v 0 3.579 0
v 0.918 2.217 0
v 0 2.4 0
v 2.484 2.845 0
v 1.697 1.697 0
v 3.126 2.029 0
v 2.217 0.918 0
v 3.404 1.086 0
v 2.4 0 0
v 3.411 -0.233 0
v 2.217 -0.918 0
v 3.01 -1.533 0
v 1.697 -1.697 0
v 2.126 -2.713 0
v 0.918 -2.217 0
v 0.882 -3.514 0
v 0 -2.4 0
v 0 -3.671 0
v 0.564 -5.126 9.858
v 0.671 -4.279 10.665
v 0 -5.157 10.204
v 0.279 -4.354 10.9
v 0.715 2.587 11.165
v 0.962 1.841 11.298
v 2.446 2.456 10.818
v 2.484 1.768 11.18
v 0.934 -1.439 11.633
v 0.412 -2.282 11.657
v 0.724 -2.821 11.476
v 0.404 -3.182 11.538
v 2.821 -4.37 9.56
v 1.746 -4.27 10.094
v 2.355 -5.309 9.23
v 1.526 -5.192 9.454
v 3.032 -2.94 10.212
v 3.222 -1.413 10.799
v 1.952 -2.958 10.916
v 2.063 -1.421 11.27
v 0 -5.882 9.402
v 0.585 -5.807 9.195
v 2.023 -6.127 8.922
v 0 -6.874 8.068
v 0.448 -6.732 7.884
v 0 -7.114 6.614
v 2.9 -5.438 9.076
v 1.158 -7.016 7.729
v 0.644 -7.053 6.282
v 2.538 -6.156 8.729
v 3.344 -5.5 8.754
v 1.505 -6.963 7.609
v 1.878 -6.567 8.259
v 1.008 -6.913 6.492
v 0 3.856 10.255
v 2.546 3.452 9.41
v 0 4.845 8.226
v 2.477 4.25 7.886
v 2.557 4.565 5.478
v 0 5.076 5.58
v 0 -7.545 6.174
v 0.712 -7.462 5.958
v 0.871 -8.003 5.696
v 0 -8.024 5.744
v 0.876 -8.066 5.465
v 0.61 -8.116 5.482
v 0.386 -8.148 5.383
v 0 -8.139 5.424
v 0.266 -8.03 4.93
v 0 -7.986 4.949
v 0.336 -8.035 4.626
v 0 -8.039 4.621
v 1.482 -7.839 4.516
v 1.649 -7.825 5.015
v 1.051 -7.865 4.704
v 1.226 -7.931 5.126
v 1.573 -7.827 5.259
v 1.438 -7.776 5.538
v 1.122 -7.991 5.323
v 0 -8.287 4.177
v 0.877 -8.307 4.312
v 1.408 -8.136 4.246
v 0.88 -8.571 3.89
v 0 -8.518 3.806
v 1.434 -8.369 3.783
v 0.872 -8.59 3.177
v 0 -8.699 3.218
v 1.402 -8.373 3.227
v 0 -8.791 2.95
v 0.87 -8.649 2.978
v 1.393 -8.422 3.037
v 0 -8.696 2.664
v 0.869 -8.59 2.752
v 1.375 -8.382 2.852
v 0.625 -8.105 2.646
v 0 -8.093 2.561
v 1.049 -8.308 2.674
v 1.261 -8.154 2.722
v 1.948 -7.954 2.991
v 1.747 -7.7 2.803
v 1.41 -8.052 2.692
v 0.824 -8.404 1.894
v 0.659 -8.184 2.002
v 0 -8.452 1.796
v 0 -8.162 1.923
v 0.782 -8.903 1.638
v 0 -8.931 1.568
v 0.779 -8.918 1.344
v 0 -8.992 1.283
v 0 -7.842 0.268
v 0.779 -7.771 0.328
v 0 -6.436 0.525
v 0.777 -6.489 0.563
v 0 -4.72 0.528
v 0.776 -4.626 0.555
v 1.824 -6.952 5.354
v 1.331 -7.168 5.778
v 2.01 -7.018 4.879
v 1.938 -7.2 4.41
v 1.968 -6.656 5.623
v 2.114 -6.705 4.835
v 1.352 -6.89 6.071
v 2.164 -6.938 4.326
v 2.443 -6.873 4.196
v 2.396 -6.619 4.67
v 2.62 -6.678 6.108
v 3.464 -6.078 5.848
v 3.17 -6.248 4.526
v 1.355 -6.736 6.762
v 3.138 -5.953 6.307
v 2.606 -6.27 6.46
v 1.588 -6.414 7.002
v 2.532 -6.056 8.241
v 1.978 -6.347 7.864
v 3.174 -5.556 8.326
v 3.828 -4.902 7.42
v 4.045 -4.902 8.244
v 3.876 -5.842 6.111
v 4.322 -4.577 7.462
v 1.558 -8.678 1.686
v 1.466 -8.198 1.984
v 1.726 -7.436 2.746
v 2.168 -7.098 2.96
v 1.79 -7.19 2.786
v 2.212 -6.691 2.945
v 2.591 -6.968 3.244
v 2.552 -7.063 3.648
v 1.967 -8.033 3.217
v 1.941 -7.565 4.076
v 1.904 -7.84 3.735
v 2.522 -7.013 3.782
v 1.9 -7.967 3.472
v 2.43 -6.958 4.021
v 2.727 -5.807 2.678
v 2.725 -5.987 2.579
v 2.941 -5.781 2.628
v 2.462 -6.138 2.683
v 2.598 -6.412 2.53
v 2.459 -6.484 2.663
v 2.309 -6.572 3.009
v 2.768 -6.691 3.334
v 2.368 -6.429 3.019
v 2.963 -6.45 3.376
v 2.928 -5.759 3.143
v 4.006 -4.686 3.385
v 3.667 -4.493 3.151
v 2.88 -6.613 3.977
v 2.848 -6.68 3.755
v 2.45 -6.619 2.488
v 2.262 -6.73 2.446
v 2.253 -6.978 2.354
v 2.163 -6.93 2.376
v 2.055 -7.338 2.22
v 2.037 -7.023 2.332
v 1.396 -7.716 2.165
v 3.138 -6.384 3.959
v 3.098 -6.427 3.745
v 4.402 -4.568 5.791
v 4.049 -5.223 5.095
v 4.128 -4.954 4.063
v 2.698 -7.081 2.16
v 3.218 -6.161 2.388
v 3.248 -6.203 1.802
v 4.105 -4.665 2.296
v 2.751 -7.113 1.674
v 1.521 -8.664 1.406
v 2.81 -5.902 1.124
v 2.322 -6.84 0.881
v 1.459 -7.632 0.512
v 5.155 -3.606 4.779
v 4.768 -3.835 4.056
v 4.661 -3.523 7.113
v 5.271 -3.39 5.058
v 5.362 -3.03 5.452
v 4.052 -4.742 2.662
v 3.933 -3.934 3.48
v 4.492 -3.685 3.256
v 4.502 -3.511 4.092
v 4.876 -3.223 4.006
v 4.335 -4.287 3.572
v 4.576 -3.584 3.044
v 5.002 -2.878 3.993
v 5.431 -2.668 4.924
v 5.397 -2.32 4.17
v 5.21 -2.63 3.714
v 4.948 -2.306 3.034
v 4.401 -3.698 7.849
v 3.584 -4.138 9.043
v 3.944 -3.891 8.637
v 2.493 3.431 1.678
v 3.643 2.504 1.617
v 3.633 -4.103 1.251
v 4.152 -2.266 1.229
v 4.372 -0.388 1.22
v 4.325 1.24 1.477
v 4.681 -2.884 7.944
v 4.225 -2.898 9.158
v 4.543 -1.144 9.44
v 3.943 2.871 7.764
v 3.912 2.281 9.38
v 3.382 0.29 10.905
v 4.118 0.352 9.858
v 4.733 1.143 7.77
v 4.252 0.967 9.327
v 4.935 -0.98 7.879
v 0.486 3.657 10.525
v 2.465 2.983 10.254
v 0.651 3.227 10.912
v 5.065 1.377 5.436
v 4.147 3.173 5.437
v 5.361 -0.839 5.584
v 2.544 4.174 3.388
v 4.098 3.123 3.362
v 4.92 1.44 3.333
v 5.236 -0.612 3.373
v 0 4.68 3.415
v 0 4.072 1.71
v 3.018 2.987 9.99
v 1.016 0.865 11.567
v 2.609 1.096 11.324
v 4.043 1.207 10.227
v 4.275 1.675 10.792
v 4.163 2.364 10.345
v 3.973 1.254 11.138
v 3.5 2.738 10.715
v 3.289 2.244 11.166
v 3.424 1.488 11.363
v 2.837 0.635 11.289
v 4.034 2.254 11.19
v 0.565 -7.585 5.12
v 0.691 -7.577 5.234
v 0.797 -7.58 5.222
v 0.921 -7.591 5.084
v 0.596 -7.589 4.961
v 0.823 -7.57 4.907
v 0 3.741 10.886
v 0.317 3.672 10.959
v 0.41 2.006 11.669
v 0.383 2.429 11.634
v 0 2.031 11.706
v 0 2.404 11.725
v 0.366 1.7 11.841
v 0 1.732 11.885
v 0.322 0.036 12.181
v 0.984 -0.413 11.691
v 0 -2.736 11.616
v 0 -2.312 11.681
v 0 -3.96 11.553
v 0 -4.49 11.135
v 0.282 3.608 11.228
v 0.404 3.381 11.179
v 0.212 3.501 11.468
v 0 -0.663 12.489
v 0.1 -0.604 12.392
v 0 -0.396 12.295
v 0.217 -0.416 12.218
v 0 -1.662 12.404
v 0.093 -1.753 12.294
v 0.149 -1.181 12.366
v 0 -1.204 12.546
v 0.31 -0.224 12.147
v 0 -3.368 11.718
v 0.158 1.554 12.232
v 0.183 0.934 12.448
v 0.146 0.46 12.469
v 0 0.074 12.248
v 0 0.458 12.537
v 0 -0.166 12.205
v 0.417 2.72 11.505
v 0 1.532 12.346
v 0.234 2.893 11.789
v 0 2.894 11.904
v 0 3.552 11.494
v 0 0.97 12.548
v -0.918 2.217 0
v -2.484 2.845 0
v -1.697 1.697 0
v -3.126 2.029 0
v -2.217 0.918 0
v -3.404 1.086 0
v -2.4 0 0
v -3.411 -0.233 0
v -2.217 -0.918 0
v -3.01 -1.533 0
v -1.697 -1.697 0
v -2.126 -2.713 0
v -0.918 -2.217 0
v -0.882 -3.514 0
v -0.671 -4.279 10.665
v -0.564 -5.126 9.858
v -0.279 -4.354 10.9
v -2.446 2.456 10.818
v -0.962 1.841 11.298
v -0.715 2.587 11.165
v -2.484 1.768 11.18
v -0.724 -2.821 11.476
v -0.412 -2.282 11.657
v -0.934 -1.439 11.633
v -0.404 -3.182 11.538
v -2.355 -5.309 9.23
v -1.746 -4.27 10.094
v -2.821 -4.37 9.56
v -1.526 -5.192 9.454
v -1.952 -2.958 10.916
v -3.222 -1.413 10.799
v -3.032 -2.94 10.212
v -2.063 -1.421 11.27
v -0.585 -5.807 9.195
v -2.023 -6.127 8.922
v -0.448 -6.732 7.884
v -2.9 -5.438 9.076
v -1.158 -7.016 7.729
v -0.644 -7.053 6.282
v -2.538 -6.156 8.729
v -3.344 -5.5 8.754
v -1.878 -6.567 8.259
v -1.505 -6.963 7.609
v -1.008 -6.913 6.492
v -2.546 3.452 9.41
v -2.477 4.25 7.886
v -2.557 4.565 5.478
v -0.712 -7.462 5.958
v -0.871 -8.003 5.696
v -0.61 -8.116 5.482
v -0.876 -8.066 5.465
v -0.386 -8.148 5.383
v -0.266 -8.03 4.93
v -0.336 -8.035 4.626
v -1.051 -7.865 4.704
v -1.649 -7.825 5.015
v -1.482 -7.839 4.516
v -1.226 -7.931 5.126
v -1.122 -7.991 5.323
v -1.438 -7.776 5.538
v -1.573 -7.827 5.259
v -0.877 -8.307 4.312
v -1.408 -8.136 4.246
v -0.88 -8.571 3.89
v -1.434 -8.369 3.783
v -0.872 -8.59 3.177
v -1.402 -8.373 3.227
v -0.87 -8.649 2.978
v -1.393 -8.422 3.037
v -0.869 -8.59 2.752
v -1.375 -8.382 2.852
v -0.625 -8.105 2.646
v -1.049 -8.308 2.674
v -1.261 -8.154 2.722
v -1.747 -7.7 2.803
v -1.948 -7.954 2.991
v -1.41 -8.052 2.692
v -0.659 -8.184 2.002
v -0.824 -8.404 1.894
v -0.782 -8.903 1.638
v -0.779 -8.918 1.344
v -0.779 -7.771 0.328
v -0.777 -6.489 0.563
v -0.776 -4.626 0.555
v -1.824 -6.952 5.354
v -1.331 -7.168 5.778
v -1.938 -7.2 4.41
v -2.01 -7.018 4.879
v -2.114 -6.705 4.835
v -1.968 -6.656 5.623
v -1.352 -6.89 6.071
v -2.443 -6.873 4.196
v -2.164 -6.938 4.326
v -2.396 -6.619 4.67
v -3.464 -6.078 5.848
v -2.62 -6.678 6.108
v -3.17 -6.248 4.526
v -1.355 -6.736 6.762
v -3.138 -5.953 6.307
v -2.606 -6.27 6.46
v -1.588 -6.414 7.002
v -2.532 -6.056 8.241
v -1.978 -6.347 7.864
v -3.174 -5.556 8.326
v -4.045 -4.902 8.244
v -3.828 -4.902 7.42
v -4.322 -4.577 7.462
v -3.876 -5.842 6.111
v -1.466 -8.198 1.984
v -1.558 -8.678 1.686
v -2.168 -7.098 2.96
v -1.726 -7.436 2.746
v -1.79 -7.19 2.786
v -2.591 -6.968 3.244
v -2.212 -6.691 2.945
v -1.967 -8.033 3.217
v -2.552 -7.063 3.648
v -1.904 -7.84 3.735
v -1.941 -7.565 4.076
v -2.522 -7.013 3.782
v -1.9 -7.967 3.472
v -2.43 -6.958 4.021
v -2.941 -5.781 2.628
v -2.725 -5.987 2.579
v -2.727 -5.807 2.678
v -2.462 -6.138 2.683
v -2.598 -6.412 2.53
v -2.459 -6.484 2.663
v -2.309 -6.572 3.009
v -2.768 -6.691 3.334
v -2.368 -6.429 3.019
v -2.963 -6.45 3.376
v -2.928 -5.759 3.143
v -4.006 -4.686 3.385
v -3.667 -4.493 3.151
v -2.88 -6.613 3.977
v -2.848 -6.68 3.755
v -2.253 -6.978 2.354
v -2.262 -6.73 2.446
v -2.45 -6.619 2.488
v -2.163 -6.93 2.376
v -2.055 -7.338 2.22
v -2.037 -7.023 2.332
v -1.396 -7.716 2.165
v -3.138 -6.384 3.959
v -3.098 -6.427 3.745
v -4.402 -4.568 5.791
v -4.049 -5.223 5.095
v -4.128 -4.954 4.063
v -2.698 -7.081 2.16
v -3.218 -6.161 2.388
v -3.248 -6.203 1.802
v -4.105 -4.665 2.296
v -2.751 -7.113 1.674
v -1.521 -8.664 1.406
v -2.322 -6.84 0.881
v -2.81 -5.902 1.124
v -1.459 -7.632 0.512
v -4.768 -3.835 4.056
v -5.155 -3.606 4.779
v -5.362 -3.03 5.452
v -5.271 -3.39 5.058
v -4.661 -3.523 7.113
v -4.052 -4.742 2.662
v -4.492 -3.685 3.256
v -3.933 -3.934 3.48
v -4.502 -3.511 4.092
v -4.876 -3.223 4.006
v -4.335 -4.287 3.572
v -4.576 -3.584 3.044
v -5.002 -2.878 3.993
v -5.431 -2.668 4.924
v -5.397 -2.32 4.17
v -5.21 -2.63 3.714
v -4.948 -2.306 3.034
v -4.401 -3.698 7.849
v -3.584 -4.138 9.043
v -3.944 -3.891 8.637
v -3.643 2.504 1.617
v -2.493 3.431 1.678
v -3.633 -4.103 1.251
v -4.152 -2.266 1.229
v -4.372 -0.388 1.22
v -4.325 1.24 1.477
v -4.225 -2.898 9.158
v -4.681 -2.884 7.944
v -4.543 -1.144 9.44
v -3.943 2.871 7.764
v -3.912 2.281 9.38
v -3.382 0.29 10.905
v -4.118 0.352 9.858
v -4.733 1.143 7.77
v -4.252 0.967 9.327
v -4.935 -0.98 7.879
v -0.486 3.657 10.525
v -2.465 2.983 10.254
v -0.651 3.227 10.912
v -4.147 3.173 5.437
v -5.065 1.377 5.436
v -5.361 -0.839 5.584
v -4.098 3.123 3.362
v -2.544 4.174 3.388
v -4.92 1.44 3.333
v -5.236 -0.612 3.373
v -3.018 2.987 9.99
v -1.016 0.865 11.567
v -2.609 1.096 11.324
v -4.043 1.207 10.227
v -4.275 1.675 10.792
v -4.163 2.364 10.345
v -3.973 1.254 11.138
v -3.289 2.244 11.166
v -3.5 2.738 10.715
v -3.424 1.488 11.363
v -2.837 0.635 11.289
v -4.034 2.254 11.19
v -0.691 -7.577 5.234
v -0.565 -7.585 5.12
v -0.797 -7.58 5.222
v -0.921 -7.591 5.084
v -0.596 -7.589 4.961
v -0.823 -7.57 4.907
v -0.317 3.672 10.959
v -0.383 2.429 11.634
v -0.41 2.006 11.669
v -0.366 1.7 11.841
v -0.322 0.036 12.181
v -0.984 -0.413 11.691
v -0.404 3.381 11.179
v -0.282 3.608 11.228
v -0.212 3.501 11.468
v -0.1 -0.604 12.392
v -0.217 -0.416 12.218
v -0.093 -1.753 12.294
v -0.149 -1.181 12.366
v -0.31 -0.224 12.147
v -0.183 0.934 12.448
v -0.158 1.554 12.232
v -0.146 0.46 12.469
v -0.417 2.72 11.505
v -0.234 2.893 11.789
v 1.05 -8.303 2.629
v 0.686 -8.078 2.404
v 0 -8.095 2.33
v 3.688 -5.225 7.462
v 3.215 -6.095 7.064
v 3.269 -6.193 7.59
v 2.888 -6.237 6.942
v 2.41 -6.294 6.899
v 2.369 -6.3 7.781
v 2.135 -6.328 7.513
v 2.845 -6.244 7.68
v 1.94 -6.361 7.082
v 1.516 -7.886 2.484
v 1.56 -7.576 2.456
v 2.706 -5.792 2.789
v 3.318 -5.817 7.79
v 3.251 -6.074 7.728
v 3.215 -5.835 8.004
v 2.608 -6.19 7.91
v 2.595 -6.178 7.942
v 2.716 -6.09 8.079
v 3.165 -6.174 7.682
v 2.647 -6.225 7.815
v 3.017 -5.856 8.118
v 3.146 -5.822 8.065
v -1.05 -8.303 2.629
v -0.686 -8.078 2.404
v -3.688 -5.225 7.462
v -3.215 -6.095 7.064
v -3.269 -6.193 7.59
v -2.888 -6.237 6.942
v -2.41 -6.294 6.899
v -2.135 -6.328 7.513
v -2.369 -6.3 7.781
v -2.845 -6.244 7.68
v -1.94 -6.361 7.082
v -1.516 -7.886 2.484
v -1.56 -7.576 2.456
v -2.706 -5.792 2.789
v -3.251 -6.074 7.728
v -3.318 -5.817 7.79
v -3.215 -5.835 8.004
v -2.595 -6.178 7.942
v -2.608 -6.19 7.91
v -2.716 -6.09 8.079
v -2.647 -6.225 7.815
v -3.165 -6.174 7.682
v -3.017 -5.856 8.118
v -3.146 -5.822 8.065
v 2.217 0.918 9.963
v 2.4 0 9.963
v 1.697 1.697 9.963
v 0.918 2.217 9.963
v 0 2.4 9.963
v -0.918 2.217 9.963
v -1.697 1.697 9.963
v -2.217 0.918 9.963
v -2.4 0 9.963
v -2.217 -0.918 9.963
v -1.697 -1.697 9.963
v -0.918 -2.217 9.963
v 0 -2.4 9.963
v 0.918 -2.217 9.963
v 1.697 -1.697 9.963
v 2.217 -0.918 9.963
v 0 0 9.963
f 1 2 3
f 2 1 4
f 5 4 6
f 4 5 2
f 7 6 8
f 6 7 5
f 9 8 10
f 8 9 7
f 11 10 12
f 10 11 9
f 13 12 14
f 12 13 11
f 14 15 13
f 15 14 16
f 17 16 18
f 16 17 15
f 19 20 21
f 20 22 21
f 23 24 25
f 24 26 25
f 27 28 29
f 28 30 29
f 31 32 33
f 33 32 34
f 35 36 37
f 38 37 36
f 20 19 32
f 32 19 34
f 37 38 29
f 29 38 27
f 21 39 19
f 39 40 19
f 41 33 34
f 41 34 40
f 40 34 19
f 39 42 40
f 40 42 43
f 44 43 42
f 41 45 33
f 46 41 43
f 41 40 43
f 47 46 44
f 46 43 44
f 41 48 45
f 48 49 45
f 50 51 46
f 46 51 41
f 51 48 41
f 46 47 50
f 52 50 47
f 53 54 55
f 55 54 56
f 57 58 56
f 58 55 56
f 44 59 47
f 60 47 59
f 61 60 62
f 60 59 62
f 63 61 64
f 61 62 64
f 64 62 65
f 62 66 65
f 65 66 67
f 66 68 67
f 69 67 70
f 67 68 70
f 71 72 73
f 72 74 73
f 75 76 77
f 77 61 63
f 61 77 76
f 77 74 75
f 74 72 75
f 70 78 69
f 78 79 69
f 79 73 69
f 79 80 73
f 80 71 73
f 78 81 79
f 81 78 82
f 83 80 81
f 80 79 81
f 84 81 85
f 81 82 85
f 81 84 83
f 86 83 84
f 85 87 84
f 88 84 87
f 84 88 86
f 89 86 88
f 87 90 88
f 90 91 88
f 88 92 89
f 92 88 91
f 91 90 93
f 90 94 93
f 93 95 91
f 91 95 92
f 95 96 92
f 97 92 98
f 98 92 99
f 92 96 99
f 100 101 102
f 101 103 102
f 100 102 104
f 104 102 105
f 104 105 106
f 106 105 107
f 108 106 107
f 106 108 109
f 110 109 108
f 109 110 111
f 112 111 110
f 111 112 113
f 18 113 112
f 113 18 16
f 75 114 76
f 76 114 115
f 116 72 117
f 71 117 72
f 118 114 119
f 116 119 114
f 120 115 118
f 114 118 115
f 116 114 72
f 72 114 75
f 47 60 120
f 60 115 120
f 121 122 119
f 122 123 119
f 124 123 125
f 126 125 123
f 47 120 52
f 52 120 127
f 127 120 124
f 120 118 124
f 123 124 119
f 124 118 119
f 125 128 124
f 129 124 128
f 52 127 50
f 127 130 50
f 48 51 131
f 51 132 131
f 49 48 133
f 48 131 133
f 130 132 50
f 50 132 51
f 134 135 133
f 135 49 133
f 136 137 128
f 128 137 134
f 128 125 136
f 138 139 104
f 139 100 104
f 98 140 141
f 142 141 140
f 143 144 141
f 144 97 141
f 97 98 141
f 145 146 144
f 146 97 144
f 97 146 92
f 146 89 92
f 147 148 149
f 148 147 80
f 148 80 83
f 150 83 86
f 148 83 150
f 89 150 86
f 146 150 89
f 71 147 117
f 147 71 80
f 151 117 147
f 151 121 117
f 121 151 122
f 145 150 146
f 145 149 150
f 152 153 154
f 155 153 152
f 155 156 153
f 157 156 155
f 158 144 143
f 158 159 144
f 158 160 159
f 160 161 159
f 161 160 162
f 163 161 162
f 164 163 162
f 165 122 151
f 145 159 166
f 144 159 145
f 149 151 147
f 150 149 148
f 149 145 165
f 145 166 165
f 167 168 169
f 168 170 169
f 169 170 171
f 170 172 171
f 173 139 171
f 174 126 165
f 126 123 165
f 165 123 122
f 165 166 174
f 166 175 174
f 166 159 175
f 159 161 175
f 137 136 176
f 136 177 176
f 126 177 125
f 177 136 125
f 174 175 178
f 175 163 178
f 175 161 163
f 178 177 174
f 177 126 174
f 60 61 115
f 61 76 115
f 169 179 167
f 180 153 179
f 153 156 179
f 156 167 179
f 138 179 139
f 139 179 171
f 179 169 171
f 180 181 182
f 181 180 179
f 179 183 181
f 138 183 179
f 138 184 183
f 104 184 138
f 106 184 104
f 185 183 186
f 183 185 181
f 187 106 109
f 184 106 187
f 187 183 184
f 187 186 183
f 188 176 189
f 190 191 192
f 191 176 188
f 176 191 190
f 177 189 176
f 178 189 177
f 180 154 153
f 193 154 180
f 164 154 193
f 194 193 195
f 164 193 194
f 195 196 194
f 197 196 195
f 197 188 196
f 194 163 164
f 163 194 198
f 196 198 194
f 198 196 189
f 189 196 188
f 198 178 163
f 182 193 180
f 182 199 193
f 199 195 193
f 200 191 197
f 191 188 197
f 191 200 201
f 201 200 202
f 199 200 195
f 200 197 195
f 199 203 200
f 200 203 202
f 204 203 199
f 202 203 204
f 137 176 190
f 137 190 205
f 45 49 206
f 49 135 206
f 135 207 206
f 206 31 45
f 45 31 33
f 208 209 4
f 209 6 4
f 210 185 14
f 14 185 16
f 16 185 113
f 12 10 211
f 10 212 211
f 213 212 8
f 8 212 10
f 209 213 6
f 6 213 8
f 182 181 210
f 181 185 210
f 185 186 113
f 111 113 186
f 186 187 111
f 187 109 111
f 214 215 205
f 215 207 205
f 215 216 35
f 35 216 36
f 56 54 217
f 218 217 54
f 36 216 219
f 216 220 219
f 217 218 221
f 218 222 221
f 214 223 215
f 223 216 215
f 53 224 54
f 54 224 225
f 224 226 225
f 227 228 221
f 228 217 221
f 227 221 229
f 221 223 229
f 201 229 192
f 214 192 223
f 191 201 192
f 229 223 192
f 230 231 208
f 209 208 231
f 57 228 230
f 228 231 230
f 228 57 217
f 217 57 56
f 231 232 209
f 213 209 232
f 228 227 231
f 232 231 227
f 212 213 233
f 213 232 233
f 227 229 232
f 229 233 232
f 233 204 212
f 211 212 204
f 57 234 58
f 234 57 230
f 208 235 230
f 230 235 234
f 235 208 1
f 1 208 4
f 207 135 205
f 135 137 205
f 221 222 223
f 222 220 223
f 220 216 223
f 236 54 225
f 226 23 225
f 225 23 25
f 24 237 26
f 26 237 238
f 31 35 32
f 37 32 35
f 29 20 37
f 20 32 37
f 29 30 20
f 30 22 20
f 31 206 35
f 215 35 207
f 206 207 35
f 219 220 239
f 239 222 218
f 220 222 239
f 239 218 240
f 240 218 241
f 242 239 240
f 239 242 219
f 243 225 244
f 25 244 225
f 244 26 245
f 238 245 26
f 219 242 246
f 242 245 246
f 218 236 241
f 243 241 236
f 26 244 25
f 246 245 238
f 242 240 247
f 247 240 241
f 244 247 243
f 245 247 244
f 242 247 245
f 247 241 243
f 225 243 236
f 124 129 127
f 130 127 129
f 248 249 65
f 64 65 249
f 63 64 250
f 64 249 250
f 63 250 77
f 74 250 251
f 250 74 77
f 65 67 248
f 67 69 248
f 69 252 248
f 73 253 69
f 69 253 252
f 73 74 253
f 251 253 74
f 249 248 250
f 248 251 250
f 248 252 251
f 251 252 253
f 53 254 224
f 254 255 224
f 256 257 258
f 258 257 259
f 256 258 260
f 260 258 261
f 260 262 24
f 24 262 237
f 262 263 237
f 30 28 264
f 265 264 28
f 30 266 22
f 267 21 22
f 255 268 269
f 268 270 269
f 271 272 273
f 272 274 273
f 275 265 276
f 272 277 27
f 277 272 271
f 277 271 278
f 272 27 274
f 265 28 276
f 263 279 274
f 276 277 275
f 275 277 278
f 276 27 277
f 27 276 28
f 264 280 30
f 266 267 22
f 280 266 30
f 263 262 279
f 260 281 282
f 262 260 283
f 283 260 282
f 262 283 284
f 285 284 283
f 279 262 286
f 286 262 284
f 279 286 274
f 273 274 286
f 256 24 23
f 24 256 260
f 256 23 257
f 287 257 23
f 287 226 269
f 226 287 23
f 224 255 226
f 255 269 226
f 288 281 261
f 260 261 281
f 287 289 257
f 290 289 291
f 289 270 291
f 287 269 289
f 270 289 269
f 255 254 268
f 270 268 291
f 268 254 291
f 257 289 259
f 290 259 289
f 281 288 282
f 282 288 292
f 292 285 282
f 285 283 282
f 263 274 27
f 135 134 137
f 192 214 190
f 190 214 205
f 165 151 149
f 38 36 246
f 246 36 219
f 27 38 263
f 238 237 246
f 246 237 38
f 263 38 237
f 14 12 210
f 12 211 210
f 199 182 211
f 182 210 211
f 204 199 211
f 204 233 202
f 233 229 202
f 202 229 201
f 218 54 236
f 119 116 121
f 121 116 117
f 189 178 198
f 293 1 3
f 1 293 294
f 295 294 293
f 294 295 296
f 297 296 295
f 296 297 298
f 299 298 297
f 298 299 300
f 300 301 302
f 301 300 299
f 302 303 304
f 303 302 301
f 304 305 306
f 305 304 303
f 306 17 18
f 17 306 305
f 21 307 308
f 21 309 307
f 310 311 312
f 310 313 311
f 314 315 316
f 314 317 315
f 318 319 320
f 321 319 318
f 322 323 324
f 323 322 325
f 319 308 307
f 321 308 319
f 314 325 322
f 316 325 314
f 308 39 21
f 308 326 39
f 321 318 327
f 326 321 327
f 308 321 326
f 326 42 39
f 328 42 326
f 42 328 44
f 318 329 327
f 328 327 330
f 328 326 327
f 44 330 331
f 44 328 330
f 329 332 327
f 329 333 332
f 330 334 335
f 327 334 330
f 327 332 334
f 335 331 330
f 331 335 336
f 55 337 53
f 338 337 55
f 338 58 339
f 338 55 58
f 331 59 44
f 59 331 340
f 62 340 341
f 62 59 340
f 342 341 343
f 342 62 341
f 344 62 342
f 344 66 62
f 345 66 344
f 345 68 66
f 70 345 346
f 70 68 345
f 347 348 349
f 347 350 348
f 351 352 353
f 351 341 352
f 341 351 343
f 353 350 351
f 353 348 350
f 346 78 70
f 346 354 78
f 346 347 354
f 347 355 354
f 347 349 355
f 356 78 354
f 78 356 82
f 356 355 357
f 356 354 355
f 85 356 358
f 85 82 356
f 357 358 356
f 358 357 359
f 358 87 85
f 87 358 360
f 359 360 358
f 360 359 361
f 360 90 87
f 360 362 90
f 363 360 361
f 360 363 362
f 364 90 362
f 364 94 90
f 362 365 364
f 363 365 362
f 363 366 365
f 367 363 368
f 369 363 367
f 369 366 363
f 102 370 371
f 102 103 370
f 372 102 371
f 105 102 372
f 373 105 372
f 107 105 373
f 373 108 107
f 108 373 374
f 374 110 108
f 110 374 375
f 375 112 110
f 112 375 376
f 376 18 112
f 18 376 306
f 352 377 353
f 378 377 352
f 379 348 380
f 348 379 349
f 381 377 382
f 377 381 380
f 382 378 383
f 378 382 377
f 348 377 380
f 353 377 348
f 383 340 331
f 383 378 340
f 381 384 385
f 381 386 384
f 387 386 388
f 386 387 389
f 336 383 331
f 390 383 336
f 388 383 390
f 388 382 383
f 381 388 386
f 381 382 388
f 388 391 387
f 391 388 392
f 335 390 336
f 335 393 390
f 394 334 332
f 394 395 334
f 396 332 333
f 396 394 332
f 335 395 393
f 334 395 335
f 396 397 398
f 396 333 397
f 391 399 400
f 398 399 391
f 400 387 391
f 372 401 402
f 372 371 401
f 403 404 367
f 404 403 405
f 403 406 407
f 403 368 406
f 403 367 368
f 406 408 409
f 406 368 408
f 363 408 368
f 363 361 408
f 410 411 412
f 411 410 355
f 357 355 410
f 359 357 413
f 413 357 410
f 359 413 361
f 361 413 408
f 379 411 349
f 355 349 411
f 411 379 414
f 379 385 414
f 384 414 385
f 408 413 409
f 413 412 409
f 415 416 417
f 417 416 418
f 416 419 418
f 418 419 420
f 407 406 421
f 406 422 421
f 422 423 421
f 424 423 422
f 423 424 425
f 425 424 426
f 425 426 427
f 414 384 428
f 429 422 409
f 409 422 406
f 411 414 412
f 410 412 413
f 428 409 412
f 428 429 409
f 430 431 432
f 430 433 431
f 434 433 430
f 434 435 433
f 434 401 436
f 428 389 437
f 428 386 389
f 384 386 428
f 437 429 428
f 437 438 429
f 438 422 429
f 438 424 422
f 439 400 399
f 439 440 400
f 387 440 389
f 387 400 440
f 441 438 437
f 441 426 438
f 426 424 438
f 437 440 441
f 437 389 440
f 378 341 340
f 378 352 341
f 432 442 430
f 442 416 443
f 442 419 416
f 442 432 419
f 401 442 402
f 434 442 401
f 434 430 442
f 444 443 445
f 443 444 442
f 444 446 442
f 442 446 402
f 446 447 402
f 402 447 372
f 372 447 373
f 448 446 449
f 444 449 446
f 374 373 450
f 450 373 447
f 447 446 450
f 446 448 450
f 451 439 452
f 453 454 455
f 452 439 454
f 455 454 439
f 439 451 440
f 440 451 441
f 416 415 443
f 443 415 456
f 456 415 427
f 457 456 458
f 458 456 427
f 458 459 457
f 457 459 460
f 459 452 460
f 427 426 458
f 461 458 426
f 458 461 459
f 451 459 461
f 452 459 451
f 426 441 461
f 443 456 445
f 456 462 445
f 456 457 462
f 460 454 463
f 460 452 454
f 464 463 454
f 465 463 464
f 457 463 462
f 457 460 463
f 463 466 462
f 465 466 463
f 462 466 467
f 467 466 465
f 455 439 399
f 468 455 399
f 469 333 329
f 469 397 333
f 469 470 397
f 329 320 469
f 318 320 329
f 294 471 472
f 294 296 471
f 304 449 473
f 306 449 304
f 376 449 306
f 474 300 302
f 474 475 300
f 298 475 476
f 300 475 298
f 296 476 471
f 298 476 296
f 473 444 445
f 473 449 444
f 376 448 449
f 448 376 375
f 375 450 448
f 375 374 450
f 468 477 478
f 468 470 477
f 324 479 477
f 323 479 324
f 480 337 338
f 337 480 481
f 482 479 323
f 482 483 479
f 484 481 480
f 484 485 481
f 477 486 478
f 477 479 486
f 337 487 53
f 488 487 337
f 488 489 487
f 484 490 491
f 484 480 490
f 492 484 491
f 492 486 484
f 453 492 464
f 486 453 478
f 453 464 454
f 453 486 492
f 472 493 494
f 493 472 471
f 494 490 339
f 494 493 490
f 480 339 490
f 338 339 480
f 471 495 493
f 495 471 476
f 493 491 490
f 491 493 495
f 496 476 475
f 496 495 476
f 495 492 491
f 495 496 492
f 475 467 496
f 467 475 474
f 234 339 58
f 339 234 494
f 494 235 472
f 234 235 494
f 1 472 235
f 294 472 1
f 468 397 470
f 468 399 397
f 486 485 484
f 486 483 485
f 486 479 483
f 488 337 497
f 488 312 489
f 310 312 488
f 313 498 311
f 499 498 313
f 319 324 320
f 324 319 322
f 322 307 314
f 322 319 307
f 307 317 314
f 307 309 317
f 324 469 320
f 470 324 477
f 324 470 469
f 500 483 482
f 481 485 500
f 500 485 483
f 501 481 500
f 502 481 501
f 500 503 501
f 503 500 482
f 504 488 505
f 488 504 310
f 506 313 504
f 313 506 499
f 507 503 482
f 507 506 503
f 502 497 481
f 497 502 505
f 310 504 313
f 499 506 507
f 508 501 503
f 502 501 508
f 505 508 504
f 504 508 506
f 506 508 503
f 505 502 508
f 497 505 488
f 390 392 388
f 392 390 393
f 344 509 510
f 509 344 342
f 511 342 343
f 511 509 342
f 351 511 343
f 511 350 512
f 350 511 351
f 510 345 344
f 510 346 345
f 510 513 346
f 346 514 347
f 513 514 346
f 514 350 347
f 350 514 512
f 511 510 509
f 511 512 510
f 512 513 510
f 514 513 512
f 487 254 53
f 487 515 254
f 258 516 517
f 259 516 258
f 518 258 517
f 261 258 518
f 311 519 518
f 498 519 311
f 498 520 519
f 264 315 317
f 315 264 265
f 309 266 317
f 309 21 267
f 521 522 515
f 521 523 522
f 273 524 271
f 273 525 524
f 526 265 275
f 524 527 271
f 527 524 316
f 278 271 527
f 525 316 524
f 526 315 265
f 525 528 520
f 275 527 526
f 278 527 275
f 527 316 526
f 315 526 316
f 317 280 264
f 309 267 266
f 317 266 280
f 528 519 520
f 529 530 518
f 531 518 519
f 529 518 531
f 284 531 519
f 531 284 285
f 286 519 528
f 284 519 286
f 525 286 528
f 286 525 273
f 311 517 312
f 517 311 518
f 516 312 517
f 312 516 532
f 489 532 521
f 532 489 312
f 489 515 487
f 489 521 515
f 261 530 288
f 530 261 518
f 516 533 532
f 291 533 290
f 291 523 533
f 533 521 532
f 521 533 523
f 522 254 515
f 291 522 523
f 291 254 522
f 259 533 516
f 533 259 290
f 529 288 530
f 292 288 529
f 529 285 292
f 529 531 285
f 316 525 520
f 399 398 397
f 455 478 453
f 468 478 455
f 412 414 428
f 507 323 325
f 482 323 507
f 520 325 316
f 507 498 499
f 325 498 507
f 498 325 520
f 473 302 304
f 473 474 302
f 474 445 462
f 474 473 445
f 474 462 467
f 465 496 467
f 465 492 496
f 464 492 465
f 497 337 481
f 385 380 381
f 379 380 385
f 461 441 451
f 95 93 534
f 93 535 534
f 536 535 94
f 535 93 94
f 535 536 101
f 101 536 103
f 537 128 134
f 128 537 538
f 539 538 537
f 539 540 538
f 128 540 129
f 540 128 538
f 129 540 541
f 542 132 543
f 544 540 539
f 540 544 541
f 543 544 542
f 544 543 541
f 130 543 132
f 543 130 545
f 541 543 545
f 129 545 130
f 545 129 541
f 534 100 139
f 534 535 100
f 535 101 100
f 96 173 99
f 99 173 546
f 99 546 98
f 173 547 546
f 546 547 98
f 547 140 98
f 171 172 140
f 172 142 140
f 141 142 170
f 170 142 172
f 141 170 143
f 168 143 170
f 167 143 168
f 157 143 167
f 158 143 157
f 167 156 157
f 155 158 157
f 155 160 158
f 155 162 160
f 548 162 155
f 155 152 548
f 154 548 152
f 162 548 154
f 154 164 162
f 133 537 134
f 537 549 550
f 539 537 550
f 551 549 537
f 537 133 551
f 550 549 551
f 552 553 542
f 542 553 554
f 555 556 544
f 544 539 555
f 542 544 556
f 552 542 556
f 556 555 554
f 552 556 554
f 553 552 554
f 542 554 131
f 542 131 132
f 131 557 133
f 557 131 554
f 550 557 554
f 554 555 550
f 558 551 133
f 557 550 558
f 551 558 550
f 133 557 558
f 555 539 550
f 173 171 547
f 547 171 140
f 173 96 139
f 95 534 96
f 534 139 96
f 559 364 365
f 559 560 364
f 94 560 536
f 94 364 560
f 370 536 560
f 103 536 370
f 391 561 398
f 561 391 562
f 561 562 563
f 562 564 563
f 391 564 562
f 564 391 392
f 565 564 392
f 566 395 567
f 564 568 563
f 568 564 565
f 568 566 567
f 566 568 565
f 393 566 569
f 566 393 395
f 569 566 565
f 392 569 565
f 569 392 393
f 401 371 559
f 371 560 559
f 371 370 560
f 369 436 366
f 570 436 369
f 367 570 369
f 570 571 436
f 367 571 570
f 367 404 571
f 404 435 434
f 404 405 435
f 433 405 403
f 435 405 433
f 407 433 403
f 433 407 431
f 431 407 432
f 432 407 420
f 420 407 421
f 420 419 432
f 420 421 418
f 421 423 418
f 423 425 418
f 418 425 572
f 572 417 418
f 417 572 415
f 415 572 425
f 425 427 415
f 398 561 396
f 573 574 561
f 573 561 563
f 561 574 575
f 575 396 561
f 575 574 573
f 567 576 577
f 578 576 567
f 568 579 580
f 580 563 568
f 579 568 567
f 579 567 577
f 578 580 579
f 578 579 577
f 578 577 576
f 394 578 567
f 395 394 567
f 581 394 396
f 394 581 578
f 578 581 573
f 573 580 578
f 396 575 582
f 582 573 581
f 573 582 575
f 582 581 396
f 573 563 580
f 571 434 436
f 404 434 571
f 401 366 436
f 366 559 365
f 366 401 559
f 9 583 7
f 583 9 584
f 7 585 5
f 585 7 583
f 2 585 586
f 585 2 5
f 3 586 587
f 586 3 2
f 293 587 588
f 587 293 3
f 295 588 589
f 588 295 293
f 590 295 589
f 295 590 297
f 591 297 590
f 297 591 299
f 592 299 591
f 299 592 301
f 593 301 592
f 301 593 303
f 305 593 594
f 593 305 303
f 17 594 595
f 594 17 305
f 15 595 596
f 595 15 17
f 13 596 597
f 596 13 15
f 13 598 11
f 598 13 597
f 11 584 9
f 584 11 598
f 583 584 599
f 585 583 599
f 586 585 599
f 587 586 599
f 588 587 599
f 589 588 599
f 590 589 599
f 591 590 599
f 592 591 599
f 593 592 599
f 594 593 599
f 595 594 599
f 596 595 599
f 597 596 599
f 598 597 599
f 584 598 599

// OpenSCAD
use <../lib.scad>
use <../p/4-4cyli.scad>
use <../p/4-4disc.scad>
use <../p/4-4edge.scad>
use <s/87570p02s01.scad>
use <s/87570s01.scad>
function ldraw_lib__87570p02() = [
// 0 Minifig Head Trandoshan with White Teeth and Orange Eyes with Black and White Pupil Pattern
// 0 Name: 87570p02.dat
// 0 Author: Gerald Lasser [GeraldLasser]
// 0 !LDRAW_ORG Part UPDATE 2022-01
// 0 !LICENSE Licensed under CC BY 2.0 and CC BY 4.0 : see CAreadme.txt
// 
// 0 BFC CERTIFY CCW
  [0,"BFC","CERTIFY"],
  [0,"BFC","CCW"],
// 
// 0 !KEYWORDS Boosk, Bricklink 87570pb02, Set 75167, Star Wars
// 
// 0 !HISTORY 2022-01-14 [PTadmin] Official Update 2022-01
// 
// 
// 1 16 0 0 0 1 0 0 0 1 0 0 0 1 s\87570s01.dat
  [1,16,0,0,0,1,0,0,0,1,0,0,0,1, ldraw_lib__s__87570s01()],
// 1 16 0 0 0 -1 0 0 0 1 0 0 0 1 s\87570s01.dat
  [1,16,0,0,0,-1,0,0,0,1,0,0,0,1, ldraw_lib__s__87570s01()],
// 1 16 0 0 0 1 0 0 0 1 0 0 0 1 s\87570p02s01.dat
  [1,16,0,0,0,1,0,0,0,1,0,0,0,1, ldraw_lib__s__87570p02s01()],
// 1 16 0 0 0 -1 0 0 0 1 0 0 0 1 s\87570p02s01.dat
  [1,16,0,0,0,-1,0,0,0,1,0,0,0,1, ldraw_lib__s__87570p02s01()],
// 
// 0 BFC INVERTNEXT
  [0,"BFC","INVERTNEXT"],
// 1 16 0 -24.908 0 6 0 0 0 24.908 0 0 0 6 4-4cyli.dat
  [1,16,0,-24.908,0,6,0,0,0,24.908,0,0,0,6, ldraw_lib__4_4cyli()],
// 1 16 0 -24.908 0 6 0 0 0 -1 0 0 0 6 4-4disc.dat
  [1,16,0,-24.908,0,6,0,0,0,-1,0,0,0,6, ldraw_lib__4_4disc()],
// 1 16 0 -24.908 0 6 0 0 0 1 0 0 0 6 4-4edge.dat
  [1,16,0,-24.908,0,6,0,0,0,1,0,0,0,6, ldraw_lib__4_4edge()],
// 1 16 0 0 0 6 0 0 0 1 0 0 0 6 4-4edge.dat
  [1,16,0,0,0,6,0,0,0,1,0,0,0,6, ldraw_lib__4_4edge()],
];
module ldraw_lib__87570p02(step=0, col=false, unit=2/5, alt=false, line=0.2, solid=!$preview)
    makepoly(ldraw_lib__87570p02(), step=step, col=col, unit=unit, alt=alt, line=line, solid=solid);
ldraw_lib__87570p02(line=0.2);
